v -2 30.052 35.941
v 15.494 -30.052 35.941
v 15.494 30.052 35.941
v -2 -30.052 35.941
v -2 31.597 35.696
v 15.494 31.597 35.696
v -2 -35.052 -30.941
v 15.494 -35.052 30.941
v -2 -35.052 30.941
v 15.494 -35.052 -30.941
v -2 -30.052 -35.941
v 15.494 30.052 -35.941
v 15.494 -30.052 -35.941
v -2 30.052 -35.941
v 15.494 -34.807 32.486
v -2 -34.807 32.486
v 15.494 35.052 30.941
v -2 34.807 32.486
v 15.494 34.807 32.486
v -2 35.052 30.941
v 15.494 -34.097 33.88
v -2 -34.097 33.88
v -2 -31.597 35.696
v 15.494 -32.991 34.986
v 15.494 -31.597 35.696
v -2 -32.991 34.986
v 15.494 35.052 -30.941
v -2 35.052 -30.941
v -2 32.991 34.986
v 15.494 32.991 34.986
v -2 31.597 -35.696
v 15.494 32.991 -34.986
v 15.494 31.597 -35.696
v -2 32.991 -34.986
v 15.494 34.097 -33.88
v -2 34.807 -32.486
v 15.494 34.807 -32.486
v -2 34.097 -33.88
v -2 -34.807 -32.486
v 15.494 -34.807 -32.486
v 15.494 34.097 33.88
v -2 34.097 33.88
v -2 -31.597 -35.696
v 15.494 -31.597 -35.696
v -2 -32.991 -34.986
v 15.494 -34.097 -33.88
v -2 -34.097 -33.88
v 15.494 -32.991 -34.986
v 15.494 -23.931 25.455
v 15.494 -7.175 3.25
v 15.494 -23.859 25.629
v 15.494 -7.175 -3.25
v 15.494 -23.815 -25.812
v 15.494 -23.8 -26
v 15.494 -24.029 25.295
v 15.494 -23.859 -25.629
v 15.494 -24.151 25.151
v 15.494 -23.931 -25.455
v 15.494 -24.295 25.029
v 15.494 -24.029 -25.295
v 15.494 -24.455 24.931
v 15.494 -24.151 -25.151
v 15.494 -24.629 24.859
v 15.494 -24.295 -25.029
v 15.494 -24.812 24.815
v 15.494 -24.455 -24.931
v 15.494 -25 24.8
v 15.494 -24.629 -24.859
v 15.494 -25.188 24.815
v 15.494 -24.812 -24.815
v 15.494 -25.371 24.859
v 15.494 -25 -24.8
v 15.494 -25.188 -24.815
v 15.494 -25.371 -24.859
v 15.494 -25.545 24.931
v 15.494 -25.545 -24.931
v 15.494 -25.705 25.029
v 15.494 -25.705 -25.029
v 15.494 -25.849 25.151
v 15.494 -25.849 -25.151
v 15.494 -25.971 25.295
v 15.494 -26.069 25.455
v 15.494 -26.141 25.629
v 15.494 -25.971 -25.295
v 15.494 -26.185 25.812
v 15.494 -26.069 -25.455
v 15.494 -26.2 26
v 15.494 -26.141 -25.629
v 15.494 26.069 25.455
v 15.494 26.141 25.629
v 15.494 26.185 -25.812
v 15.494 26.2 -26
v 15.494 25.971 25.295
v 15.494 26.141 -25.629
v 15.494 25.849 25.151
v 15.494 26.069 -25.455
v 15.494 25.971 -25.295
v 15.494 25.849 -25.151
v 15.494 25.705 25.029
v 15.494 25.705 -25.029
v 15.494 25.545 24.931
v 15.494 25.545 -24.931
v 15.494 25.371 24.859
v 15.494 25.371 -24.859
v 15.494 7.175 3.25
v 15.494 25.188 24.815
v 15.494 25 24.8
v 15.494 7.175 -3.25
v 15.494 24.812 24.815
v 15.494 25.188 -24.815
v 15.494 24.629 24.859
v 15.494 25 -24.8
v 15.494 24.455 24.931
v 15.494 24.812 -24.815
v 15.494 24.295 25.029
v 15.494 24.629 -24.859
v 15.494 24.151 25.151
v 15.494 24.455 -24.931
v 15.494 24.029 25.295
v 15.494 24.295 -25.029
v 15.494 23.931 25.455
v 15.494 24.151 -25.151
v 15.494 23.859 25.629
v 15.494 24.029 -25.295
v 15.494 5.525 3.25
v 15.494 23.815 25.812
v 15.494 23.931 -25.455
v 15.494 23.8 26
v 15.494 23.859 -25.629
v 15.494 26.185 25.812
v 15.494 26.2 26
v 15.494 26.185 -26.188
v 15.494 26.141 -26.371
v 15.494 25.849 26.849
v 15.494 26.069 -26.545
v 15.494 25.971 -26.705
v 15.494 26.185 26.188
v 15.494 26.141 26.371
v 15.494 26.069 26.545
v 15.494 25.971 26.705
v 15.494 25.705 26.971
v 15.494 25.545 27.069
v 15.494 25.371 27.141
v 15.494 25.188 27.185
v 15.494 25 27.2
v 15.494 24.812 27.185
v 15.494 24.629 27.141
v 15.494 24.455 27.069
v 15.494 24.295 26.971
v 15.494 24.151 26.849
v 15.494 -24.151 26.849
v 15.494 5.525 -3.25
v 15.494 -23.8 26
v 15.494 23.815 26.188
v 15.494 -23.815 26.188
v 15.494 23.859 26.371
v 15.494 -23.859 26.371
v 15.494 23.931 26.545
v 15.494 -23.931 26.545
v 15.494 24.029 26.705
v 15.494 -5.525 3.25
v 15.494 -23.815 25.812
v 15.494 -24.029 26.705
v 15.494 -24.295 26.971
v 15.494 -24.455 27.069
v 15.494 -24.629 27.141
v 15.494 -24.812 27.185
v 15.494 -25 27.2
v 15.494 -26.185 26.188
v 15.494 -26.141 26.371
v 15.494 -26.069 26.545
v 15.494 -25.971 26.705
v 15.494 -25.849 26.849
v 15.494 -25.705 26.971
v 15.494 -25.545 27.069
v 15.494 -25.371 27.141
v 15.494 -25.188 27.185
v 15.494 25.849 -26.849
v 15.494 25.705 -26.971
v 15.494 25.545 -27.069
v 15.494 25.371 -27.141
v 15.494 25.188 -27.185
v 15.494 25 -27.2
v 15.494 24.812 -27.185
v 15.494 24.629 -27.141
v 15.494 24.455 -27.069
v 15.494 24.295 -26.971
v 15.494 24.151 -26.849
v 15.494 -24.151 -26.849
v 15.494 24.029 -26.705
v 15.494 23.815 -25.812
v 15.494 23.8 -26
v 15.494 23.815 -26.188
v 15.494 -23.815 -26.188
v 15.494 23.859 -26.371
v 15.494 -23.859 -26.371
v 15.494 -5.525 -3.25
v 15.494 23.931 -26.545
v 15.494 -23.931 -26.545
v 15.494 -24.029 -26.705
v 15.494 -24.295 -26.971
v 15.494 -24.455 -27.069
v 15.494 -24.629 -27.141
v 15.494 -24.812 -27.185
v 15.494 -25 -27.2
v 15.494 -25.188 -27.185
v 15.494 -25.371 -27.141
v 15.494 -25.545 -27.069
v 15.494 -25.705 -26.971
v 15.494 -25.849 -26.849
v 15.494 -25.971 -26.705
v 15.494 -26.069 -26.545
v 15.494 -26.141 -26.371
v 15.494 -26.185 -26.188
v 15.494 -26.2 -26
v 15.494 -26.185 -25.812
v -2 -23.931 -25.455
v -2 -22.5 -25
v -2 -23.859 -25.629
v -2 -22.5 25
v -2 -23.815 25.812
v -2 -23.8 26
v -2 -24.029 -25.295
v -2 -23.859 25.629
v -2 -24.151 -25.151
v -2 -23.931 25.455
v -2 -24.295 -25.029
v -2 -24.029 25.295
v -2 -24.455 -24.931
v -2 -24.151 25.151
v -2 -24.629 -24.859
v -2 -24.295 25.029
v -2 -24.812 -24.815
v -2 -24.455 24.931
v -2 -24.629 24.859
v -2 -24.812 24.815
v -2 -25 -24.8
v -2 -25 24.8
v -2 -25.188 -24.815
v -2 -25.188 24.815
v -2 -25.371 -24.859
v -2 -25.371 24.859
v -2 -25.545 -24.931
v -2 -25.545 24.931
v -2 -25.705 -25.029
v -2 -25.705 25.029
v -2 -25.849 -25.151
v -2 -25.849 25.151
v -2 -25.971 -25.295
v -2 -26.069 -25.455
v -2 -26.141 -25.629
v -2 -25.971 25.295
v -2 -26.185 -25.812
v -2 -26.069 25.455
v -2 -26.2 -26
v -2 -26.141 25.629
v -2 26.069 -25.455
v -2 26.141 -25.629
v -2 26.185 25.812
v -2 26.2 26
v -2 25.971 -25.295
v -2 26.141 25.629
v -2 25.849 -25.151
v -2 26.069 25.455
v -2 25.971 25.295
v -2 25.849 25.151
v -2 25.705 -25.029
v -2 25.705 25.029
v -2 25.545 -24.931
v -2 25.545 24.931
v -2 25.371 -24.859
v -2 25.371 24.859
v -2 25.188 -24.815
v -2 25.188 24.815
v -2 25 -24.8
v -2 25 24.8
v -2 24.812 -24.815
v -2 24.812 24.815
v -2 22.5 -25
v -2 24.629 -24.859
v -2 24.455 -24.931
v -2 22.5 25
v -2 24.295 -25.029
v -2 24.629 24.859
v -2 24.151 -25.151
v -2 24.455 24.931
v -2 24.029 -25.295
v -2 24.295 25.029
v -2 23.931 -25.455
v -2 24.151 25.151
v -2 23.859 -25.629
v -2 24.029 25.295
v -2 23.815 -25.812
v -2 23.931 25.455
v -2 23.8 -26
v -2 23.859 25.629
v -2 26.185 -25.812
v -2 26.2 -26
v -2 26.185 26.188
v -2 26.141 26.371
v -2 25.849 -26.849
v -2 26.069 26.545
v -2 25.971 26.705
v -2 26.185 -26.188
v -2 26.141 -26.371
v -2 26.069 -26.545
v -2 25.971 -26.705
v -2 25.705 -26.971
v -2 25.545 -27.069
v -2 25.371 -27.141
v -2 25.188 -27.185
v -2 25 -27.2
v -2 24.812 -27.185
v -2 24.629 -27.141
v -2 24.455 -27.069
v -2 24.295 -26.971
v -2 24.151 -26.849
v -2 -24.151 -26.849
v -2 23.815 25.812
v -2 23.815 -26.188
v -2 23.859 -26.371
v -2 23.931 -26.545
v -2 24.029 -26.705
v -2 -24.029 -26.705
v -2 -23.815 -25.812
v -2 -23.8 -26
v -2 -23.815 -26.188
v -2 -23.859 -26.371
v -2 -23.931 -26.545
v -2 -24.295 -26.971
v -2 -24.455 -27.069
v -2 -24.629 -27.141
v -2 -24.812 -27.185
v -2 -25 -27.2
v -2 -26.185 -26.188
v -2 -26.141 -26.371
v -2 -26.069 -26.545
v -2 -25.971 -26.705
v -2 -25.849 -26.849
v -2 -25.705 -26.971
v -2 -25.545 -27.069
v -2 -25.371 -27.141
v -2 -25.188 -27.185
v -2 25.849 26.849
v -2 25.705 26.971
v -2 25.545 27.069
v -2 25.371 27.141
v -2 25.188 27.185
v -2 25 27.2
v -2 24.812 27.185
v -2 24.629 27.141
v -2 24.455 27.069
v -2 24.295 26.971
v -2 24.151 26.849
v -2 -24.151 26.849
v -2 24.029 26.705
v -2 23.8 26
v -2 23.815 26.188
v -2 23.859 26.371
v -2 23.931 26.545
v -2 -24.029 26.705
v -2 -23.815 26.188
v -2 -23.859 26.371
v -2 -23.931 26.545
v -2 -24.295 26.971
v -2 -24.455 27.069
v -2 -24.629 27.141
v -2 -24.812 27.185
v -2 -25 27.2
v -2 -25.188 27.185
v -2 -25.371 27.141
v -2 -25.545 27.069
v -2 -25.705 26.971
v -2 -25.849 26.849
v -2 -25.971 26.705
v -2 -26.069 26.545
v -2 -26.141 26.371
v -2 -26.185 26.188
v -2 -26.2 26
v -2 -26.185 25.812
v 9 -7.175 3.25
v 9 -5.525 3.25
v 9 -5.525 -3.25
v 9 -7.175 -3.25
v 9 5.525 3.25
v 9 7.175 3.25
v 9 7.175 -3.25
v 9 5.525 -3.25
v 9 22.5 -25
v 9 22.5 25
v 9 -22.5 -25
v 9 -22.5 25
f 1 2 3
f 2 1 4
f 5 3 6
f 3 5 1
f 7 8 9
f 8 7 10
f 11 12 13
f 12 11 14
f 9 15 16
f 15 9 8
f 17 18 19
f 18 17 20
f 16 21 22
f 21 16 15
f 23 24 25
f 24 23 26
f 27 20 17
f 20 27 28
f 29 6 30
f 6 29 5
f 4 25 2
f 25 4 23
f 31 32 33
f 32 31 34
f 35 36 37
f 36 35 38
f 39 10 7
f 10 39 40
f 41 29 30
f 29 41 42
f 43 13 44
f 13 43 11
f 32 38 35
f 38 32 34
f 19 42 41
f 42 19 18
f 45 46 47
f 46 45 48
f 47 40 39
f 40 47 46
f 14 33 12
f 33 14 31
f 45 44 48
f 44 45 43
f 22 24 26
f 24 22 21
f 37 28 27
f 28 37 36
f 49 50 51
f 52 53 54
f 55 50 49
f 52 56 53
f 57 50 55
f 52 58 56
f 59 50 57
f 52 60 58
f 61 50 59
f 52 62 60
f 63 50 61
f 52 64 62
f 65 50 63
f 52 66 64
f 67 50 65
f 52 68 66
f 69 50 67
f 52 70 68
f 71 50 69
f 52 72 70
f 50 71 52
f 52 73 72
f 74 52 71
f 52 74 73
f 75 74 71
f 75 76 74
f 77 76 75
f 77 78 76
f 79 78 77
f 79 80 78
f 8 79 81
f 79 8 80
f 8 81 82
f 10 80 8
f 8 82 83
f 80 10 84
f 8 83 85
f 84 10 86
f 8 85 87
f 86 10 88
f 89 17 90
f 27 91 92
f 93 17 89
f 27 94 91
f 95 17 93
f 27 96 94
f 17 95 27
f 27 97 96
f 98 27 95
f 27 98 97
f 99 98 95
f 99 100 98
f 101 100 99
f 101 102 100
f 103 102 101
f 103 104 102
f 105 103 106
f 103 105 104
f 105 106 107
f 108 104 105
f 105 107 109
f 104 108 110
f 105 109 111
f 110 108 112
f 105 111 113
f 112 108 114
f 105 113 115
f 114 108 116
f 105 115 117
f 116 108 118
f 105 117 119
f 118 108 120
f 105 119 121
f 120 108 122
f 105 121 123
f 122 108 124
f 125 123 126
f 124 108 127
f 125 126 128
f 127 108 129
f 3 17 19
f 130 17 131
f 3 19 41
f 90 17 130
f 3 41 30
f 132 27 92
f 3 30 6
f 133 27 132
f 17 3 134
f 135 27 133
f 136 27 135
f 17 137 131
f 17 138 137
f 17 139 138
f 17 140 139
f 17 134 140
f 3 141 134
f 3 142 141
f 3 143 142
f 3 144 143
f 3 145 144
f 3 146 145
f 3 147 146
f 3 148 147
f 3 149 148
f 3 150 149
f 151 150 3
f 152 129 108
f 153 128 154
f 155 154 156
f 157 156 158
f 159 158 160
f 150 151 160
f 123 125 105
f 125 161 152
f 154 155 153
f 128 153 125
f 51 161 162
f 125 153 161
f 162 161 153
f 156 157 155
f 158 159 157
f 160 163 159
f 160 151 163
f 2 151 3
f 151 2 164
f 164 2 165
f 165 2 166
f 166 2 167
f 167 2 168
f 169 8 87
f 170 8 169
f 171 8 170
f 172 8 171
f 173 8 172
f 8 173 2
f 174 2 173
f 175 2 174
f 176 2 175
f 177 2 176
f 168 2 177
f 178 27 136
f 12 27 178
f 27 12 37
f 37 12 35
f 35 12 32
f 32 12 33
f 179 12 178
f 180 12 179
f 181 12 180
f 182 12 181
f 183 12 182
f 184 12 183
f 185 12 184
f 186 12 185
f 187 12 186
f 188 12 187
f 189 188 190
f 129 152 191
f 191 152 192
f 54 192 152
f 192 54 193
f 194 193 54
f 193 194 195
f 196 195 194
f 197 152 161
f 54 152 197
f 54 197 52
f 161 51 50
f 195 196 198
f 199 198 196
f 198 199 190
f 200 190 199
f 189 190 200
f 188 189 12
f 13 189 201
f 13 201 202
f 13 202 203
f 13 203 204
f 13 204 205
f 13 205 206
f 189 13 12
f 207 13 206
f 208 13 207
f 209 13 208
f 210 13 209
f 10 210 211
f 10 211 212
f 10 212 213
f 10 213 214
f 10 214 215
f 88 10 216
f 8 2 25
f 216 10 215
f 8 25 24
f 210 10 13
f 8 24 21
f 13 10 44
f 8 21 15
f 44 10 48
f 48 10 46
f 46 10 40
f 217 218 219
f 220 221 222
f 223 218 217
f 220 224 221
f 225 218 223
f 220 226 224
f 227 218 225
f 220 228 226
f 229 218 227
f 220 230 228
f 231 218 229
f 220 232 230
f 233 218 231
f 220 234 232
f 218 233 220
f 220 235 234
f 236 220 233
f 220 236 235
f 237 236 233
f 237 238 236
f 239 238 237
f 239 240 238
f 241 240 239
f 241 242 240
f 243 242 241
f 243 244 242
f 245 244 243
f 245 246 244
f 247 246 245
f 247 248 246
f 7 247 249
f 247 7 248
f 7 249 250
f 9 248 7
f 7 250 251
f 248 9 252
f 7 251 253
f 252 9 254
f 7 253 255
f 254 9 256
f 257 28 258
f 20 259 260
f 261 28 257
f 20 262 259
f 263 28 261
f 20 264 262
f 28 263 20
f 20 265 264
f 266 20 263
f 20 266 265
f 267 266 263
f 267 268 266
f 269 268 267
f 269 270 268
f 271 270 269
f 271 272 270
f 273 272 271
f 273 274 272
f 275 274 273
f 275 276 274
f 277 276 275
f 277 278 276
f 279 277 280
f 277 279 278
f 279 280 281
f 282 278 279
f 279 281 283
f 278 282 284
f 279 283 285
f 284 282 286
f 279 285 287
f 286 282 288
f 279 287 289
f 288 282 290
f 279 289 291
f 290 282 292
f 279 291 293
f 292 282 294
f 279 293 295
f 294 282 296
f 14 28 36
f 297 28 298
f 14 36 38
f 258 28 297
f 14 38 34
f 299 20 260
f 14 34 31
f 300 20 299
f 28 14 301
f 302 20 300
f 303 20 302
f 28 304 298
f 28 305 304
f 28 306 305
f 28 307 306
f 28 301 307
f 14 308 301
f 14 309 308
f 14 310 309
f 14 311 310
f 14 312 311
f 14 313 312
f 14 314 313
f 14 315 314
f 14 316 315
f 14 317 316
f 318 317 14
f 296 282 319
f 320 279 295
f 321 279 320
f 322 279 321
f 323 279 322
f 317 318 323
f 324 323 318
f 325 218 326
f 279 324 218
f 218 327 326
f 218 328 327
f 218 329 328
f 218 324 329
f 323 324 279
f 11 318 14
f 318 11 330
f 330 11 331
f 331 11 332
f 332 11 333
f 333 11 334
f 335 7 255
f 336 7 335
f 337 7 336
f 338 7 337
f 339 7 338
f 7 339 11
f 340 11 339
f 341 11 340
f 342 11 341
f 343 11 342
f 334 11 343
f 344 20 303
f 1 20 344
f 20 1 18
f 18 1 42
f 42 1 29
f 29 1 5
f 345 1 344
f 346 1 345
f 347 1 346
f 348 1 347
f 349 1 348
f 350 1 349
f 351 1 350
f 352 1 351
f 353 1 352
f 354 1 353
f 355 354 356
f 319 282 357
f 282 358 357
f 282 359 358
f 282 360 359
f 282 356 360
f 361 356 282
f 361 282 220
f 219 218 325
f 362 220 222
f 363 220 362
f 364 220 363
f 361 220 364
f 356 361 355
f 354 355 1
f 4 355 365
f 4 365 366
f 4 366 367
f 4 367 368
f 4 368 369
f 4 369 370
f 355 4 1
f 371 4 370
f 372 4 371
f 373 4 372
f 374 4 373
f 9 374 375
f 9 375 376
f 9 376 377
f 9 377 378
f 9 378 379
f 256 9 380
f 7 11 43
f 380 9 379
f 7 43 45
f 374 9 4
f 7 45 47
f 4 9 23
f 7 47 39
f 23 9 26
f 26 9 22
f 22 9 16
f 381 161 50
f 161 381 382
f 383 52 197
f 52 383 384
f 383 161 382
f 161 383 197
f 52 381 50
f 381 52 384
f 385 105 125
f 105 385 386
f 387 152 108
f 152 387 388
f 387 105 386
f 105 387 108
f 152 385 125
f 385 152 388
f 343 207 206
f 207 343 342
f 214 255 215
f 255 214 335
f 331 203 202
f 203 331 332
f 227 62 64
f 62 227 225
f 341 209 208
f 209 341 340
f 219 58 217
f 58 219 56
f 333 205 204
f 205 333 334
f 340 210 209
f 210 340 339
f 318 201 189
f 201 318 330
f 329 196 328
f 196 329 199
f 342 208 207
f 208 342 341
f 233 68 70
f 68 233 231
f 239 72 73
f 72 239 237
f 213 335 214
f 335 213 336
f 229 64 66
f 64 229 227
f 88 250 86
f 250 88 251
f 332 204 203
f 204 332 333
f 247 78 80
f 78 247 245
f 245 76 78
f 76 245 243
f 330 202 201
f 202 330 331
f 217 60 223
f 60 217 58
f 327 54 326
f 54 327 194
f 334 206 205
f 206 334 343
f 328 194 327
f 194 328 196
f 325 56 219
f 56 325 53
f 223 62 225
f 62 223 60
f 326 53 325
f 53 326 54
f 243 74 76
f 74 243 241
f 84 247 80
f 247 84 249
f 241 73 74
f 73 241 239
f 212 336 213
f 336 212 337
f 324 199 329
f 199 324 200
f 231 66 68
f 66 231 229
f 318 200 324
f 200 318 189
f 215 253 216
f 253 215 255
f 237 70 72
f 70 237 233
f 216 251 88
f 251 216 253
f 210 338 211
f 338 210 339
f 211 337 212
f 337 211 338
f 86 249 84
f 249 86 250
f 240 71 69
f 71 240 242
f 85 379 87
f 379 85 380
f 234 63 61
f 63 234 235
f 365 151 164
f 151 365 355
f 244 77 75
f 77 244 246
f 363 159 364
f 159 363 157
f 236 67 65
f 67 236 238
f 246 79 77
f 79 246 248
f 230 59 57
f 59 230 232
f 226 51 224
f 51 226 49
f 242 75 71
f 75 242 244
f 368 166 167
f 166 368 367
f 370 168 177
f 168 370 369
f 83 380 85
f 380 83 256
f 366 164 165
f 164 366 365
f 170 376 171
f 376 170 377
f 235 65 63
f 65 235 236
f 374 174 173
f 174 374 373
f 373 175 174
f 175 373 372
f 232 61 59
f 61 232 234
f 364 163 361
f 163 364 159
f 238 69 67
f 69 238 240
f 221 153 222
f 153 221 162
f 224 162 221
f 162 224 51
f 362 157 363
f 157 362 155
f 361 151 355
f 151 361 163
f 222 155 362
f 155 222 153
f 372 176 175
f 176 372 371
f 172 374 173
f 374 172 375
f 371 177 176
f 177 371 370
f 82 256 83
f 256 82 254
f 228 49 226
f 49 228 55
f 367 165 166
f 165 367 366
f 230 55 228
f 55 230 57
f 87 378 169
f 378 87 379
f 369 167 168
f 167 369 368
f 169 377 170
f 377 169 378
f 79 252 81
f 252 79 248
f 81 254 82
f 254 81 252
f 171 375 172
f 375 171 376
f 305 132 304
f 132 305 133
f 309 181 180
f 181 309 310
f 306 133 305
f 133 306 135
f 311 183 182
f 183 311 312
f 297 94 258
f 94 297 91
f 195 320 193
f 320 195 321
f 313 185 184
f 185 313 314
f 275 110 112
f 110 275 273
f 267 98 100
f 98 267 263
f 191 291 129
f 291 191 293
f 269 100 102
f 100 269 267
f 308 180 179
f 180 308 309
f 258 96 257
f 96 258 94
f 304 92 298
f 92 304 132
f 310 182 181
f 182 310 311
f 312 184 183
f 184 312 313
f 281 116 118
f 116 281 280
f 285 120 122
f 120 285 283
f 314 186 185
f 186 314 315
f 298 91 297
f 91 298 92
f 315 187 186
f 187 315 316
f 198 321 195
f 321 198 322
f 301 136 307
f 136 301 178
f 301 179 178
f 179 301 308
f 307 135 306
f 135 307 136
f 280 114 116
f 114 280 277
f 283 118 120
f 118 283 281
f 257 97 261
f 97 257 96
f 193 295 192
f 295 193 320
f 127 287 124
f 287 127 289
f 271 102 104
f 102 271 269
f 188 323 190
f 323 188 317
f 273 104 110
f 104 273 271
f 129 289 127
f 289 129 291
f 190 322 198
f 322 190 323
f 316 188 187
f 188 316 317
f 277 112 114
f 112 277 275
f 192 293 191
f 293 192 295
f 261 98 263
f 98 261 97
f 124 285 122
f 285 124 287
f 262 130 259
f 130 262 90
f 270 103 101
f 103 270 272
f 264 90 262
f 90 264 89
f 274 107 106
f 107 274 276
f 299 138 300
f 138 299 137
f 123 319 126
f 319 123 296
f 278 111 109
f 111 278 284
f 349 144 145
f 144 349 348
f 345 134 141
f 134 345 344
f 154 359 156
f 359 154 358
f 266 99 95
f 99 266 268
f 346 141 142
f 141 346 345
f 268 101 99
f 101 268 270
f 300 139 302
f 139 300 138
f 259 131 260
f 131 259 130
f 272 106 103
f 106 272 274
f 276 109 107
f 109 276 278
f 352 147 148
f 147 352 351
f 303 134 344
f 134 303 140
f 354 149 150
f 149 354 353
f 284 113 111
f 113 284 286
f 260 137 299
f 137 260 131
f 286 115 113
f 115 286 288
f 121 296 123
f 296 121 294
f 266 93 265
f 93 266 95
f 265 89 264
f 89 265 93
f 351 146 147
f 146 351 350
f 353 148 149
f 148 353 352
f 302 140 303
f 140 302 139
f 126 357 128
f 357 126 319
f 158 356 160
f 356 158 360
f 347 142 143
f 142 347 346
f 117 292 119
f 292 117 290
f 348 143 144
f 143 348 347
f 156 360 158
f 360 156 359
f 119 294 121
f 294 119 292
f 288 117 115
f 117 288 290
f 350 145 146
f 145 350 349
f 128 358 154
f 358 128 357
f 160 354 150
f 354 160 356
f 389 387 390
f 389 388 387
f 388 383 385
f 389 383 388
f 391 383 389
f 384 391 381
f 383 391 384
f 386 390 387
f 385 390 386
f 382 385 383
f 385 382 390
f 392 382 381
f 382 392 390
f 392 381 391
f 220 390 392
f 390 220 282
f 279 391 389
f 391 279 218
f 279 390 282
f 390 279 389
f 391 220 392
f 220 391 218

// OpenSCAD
// Millimetres. Original native task geometry. MIT.
part="intact_rear";
$fn=40;
module intact_Body(){ union(){
polyhedron(points=[[-15.494000000000002,35.052,30.941],[-15.494000000000002,34.80728258147577,32.48608497187474],[-15.494000000000002,34.097084971874736,33.879926261462366],[-15.494000000000002,32.99092626146236,34.98608497187473],[-15.494000000000002,31.59708497187474,35.696282581475764],[-15.494000000000002,30.052,35.941],[-15.494000000000002,-30.052,35.941],[-15.494000000000002,-31.59708497187474,35.696282581475764],[-15.494000000000002,-32.99092626146236,34.98608497187473],[-15.494000000000002,-34.097084971874736,33.879926261462366],[-15.494000000000002,-34.80728258147577,32.48608497187474],[-15.494000000000002,-35.052,30.941],[-15.494000000000002,-35.052,-30.941],[-15.494000000000002,-34.80728258147577,-32.48608497187474],[-15.494000000000002,-34.097084971874736,-33.879926261462366],[-15.494000000000002,-32.99092626146236,-34.98608497187473],[-15.494000000000002,-31.59708497187474,-35.696282581475764],[-15.494000000000002,-30.052,-35.941],[-15.494000000000002,30.052,-35.941],[-15.494000000000002,31.59708497187474,-35.696282581475764],[-15.494000000000002,32.99092626146236,-34.98608497187473],[-15.494000000000002,34.097084971874736,-33.87992626146237],[-15.494000000000002,34.80728258147577,-32.48608497187474],[-15.494000000000002,35.052,-30.941],[15.494000000000002,35.052,30.941],[15.494000000000002,34.80728258147577,32.48608497187474],[15.494000000000002,34.097084971874736,33.879926261462366],[15.494000000000002,32.99092626146236,34.98608497187473],[15.494000000000002,31.59708497187474,35.696282581475764],[15.494000000000002,30.052,35.941],[15.494000000000002,-30.052,35.941],[15.494000000000002,-31.59708497187474,35.696282581475764],[15.494000000000002,-32.99092626146236,34.98608497187473],[15.494000000000002,-34.097084971874736,33.879926261462366],[15.494000000000002,-34.80728258147577,32.48608497187474],[15.494000000000002,-35.052,30.941],[15.494000000000002,-35.052,-30.941],[15.494000000000002,-34.80728258147577,-32.48608497187474],[15.494000000000002,-34.097084971874736,-33.879926261462366],[15.494000000000002,-32.99092626146236,-34.98608497187473],[15.494000000000002,-31.59708497187474,-35.696282581475764],[15.494000000000002,-30.052,-35.941],[15.494000000000002,30.052,-35.941],[15.494000000000002,31.59708497187474,-35.696282581475764],[15.494000000000002,32.99092626146236,-34.98608497187473],[15.494000000000002,34.097084971874736,-33.87992626146237],[15.494000000000002,34.80728258147577,-32.48608497187474],[15.494000000000002,35.052,-30.941]],faces=[[12,11,35],[36,12,35],[18,17,41],[42,18,41],[6,5,29],[30,6,29],[5,4,29],[4,28,29],[0,23,47],[24,0,47],[23,22,47],[22,46,47],[1,0,25],[0,24,25],[2,1,25],[26,2,25],[28,4,27],[4,3,27],[3,2,27],[2,26,27],[41,17,16],[40,41,16],[6,30,31],[7,6,31],[8,7,31],[32,8,31],[46,22,45],[22,21,45],[21,20,45],[20,44,45],[18,42,43],[19,18,43],[20,19,43],[44,20,43],[12,36,37],[13,12,37],[14,13,37],[38,14,37],[40,16,39],[16,15,39],[15,14,39],[14,38,39],[11,12,9],[23,0,9],[6,7,9],[0,1,9],[16,17,9],[17,18,9],[4,5,9],[21,22,9],[5,6,9],[2,3,9],[12,13,9],[3,4,9],[10,11,9],[20,21,9],[18,19,9],[22,23,9],[1,2,9],[14,15,9],[7,8,9],[15,16,9],[19,20,9],[13,14,9],[8,32,9],[32,33,9],[30,29,34],[24,47,34],[36,35,34],[46,45,34],[28,27,34],[42,41,34],[43,42,34],[29,28,34],[25,24,34],[41,40,34],[47,46,34],[26,25,34],[27,26,34],[31,30,34],[40,39,34],[37,36,34],[32,31,34],[33,32,34],[45,44,34],[44,43,34],[38,37,34],[39,38,34],[35,11,34],[11,10,34],[10,9,34],[9,33,34]]);
}}
module intact_Body_ACBlade0(){ union(){
polyhedron(points=[[14.994,-7.111999999999999,-3.175],[14.994,-7.111999999999999,3.175],[14.994,-5.588,-3.175],[14.994,-5.588,3.175],[29.369,-7.111999999999999,-3.175],[29.369,-7.111999999999999,3.175],[29.369,-5.588,-3.175],[29.369,-5.588,3.175],[31.369,-6.6,-3.175],[31.369,-6.6,3.175],[31.369,-6.1,-3.175],[31.369,-6.1,3.175]],faces=[[0,2,3],[1,0,3],[2,6,3],[6,7,3],[4,0,5],[0,1,5],[0,4,10],[2,0,10],[4,8,10],[6,2,10],[7,6,11],[6,10,11],[1,3,9],[3,7,9],[5,1,9],[7,11,9],[8,4,9],[4,5,9],[10,8,9],[11,10,9]]);
}}
module intact_Body_ACBlade1(){ union(){
polyhedron(points=[[14.994,5.588,-3.175],[14.994,5.588,3.175],[14.994,7.111999999999999,-3.175],[14.994,7.111999999999999,3.175],[29.369,5.588,-3.175],[29.369,5.588,3.175],[29.369,7.111999999999999,-3.175],[29.369,7.111999999999999,3.175],[31.369,6.1,-3.175],[31.369,6.1,3.175],[31.369,6.6,-3.175],[31.369,6.6,3.175]],faces=[[0,2,3],[1,0,3],[2,6,3],[6,7,3],[4,0,5],[0,1,5],[0,4,10],[2,0,10],[4,8,10],[6,2,10],[7,6,11],[6,10,11],[1,3,9],[3,7,9],[5,1,9],[7,11,9],[8,4,9],[4,5,9],[10,8,9],[11,10,9]]);
}}
module damaged_Body(){ union(){
polyhedron(points=[[-6.0,35.052,30.941],[-6.0,34.80728258147577,32.48608497187474],[-6.0,34.097084971874736,33.879926261462366],[-6.0,32.99092626146236,34.98608497187473],[-6.0,31.59708497187474,35.696282581475764],[-6.0,30.052,35.941],[-6.0,-30.052,35.941],[-6.0,-31.59708497187474,35.696282581475764],[-6.0,-32.99092626146236,34.98608497187473],[-6.0,-34.097084971874736,33.879926261462366],[-6.0,-34.80728258147577,32.48608497187474],[-6.0,-35.052,30.941],[-6.0,-35.052,-30.941],[-6.0,-34.80728258147577,-32.48608497187474],[-6.0,-34.097084971874736,-33.879926261462366],[-6.0,-32.99092626146236,-34.98608497187473],[-6.0,-31.59708497187474,-35.696282581475764],[-6.0,-30.052,-35.941],[-6.0,30.052,-35.941],[-6.0,31.59708497187474,-35.696282581475764],[-6.0,32.99092626146236,-34.98608497187473],[-6.0,34.097084971874736,-33.87992626146237],[-6.0,34.80728258147577,-32.48608497187474],[-6.0,35.052,-30.941],[15.494000000000002,35.052,30.941],[15.494000000000002,34.80728258147577,32.48608497187474],[15.494000000000002,34.097084971874736,33.879926261462366],[15.494000000000002,32.99092626146236,34.98608497187473],[15.494000000000002,31.59708497187474,35.696282581475764],[15.494000000000002,30.052,35.941],[15.494000000000002,-30.052,35.941],[15.494000000000002,-31.59708497187474,35.696282581475764],[15.494000000000002,-32.99092626146236,34.98608497187473],[15.494000000000002,-34.097084971874736,33.879926261462366],[15.494000000000002,-34.80728258147577,32.48608497187474],[15.494000000000002,-35.052,30.941],[15.494000000000002,-35.052,-30.941],[15.494000000000002,-34.80728258147577,-32.48608497187474],[15.494000000000002,-34.097084971874736,-33.879926261462366],[15.494000000000002,-32.99092626146236,-34.98608497187473],[15.494000000000002,-31.59708497187474,-35.696282581475764],[15.494000000000002,-30.052,-35.941],[15.494000000000002,30.052,-35.941],[15.494000000000002,31.59708497187474,-35.696282581475764],[15.494000000000002,32.99092626146236,-34.98608497187473],[15.494000000000002,34.097084971874736,-33.87992626146237],[15.494000000000002,34.80728258147577,-32.48608497187474],[15.494000000000002,35.052,-30.941]],faces=[[12,11,35],[36,12,35],[18,17,41],[42,18,41],[6,5,29],[30,6,29],[5,4,29],[4,28,29],[0,23,47],[24,0,47],[23,22,47],[22,46,47],[1,0,25],[0,24,25],[2,1,25],[26,2,25],[28,4,27],[4,3,27],[3,2,27],[2,26,27],[41,17,16],[40,41,16],[35,11,34],[11,10,34],[10,9,34],[9,33,34],[6,30,31],[7,6,31],[46,22,45],[22,21,45],[21,20,45],[20,44,45],[18,42,43],[19,18,43],[20,19,43],[44,20,43],[11,12,14],[23,0,14],[6,7,14],[0,1,14],[8,9,14],[17,18,14],[4,5,14],[21,22,14],[5,6,14],[2,3,14],[12,13,14],[3,4,14],[10,11,14],[20,21,14],[18,19,14],[22,23,14],[1,2,14],[16,17,14],[7,8,14],[15,16,14],[9,10,14],[19,20,14],[12,36,37],[13,12,37],[14,13,37],[38,14,37],[40,16,39],[16,15,39],[15,14,39],[14,38,39],[30,29,32],[24,47,32],[36,35,32],[46,45,32],[28,27,32],[42,41,32],[35,34,32],[29,28,32],[25,24,32],[41,40,32],[47,46,32],[26,25,32],[27,26,32],[43,42,32],[31,30,32],[37,36,32],[34,33,32],[40,39,32],[45,44,32],[44,43,32],[38,37,32],[39,38,32],[33,9,32],[9,8,32],[8,7,32],[7,31,32]]);
polyhedron(points=[[-6.999999999999999,35.052,30.941],[-7.0279262145982235,34.80728258147577,32.48608497187474],[-7.108971245934641,34.097084971874736,33.879926261462366],[-7.2352018416681085,32.99092626146236,34.98608497187473],[-7.394261671587955,31.59708497187474,35.696282581475764],[-7.57058085130663,30.052,35.941],[-14.42941914869337,-30.052,35.941],[-14.605738328412045,-31.59708497187474,35.696282581475764],[-14.76479815833189,-32.99092626146236,34.98608497187473],[-14.891028754065358,-34.097084971874736,33.879926261462366],[-14.972073785401776,-34.80728258147577,32.48608497187474],[-15.0,-35.052,30.941],[-15.0,-35.052,-30.941],[-14.972073785401776,-34.80728258147577,-32.48608497187474],[-14.891028754065358,-34.097084971874736,-33.879926261462366],[-14.76479815833189,-32.99092626146236,-34.98608497187473],[-14.605738328412045,-31.59708497187474,-35.696282581475764],[-14.42941914869337,-30.052,-35.941],[-7.57058085130663,30.052,-35.941],[-7.394261671587955,31.59708497187474,-35.696282581475764],[-7.2352018416681085,32.99092626146236,-34.98608497187473],[-7.108971245934641,34.097084971874736,-33.87992626146237],[-7.0279262145982235,34.80728258147577,-32.48608497187474],[-6.999999999999999,35.052,-30.941],[-17.082649341977127,35.052,30.941],[-17.239544002517984,34.80728258147577,32.48608497187474],[-17.436933149732173,34.097084971874736,33.879926261462366],[-17.655494958599306,32.99092626146236,34.98608497187473],[-17.873835076457805,31.59708497187474,35.696282581475764],[-18.070580851306634,30.052,35.941],[-24.92941914869337,-30.052,35.941],[-25.085311733281895,-31.59708497187474,35.696282581475764],[-25.185091275263087,-32.99092626146236,34.98608497187473],[-25.21899065786289,-34.097084971874736,33.879926261462366],[-25.183691573321536,-34.80728258147577,32.48608497187474],[-25.082649341977127,-35.052,30.941],[-19.91735065802287,-35.052,-30.941],[-19.76045599748201,-34.80728258147577,-32.48608497187474],[-19.563066850267827,-34.097084971874736,-33.879926261462366],[-19.34450504140069,-32.99092626146236,-34.98608497187473],[-19.126164923542195,-31.59708497187474,-35.696282581475764],[-18.92941914869337,-30.052,-35.941],[-12.07058085130663,30.052,-35.941],[-11.914688266718104,31.59708497187474,-35.696282581475764],[-11.814908724736908,32.99092626146236,-34.98608497187473],[-11.781009342137107,34.097084971874736,-33.87992626146237],[-11.816308426678459,34.80728258147577,-32.48608497187474],[-11.91735065802287,35.052,-30.941],[-20.1368,-28.0416,-28.7528],[-22.3192,-28.0416,-14.3764],[-23.58,-28.0416,0.0],[-23.919199999999996,-28.0416,14.376400000000004],[-23.336799999999997,-28.0416,28.7528],[-19.9192,-14.0208,-28.7528],[-23.9448,-14.0208,-14.3764],[-25.820000000000004,-14.0208,0.0],[-25.5448,-14.0208,14.376400000000004],[-23.1192,-14.0208,28.7528],[-18.78,0.0,-28.7528],[-23.419999999999998,0.0,-14.3764],[-25.500000000000004,0.0,0.0],[-25.02,0.0,14.376400000000004],[-21.98,0.0,28.7528],[-16.7192,14.0208,-28.7528],[-20.7448,14.0208,-14.3764],[-22.62,14.0208,0.0],[-22.3448,14.0208,14.376400000000004],[-19.919199999999996,14.0208,28.7528],[-13.736799999999997,28.0416,-28.7528],[-15.919199999999998,28.0416,-14.3764],[-17.179999999999996,28.0416,0.0],[-17.519199999999998,28.0416,14.376400000000004],[-16.936799999999998,28.0416,28.7528]],faces=[[36,55,35],[61,29,30],[31,61,30],[24,65,47],[41,58,59],[61,66,27],[55,56,33],[47,65,46],[45,46,64],[46,65,64],[55,54,60],[54,59,60],[65,66,60],[66,61,60],[56,55,60],[61,56,60],[64,65,60],[59,64,60],[58,41,42],[59,58,42],[29,61,28],[61,27,28],[65,24,25],[66,65,26],[27,66,26],[65,25,26],[35,55,34],[55,33,34],[64,59,43],[59,42,43],[38,54,37],[55,36,37],[54,55,37],[41,59,40],[59,54,40],[33,56,32],[61,31,32],[56,61,32],[45,64,44],[64,43,44],[54,38,39],[40,54,39],[11,12,35],[12,36,35],[5,6,30],[29,5,30],[30,6,7],[31,30,7],[0,24,23],[24,47,23],[17,18,42],[41,17,42],[11,35,34],[10,11,34],[9,10,34],[33,9,34],[45,21,22],[46,45,22],[23,47,22],[47,46,22],[18,19,43],[42,18,43],[36,12,37],[12,13,37],[17,41,40],[16,17,40],[37,13,14],[38,37,14],[27,26,3],[26,2,3],[24,0,1],[25,24,1],[2,26,1],[26,25,1],[31,7,32],[7,8,32],[9,33,32],[8,9,32],[21,45,44],[20,21,44],[19,20,44],[43,19,44],[14,15,39],[38,14,39],[15,16,39],[16,40,39],[12,11,4],[11,10,4],[7,6,4],[13,12,4],[18,17,4],[6,5,4],[22,21,4],[0,23,4],[17,16,4],[1,0,4],[10,9,4],[9,8,4],[19,18,4],[16,15,4],[21,20,4],[15,14,4],[8,7,4],[23,22,4],[20,19,4],[14,13,4],[3,2,4],[2,1,4],[5,29,4],[29,28,4],[27,3,4],[28,27,4]]);
translate([-6.4,-32.552,0]) cube([1.5,2.0,52.0],center=true);
}}
module damaged_Body_ACBlade0(){ union(){
polyhedron(points=[[14.994,-7.111999999999999,-3.175],[14.994,-7.111999999999999,3.175],[14.994,-5.588,-3.175],[14.994,-5.588,3.175],[29.369,-7.111999999999999,-3.175],[29.369,-7.111999999999999,3.175],[29.369,-5.588,-3.175],[29.369,-5.588,3.175],[31.369,-6.6,-3.175],[31.369,-6.6,3.175],[31.369,-6.1,-3.175],[31.369,-6.1,3.175]],faces=[[0,2,3],[1,0,3],[2,6,3],[6,7,3],[4,0,5],[0,1,5],[0,4,10],[2,0,10],[4,8,10],[6,2,10],[7,6,11],[6,10,11],[1,3,9],[3,7,9],[5,1,9],[7,11,9],[8,4,9],[4,5,9],[10,8,9],[11,10,9]]);
}}
module damaged_Body_ACBlade1(){ union(){
polyhedron(points=[[14.994,5.588,-3.175],[14.994,5.588,3.175],[14.994,7.111999999999999,-3.175],[14.994,7.111999999999999,3.175],[29.369,5.588,-3.175],[29.369,5.588,3.175],[29.369,7.111999999999999,-3.175],[29.369,7.111999999999999,3.175],[31.369,6.1,-3.175],[31.369,6.1,3.175],[31.369,6.6,-3.175],[31.369,6.6,3.175]],faces=[[0,2,3],[1,0,3],[2,6,3],[6,7,3],[4,0,5],[0,1,5],[0,4,10],[2,0,10],[4,8,10],[6,2,10],[7,6,11],[6,10,11],[1,3,9],[3,7,9],[5,1,9],[7,11,9],[8,4,9],[4,5,9],[10,8,9],[11,10,9]]);
}}
module socket_Socket(){ union(){
translate([40.0,0,-5.0]) cube([25.0,330.0,150.0],center=true);
translate([25.0,0,-90.0]) cube([120.0,350.0,10.0],center=true);
translate([2.0,-130.0,22.0]) cube([4.0,70.0,36.0],center=true);
translate([2.0,-130.0,-22.0]) cube([4.0,70.0,36.0],center=true);
translate([2.0,-151.35000000000002,0]) cube([4.0,27.300000000000004,8.0],center=true);
translate([2.0,-130.0,0]) cube([4.0,9.999999999999998,8.0],center=true);
translate([2.0,-108.64999999999999,0]) cube([4.0,27.300000000000004,8.0],center=true);
translate([2.0,130.0,22.0]) cube([4.0,70.0,36.0],center=true);
translate([2.0,130.0,-22.0]) cube([4.0,70.0,36.0],center=true);
translate([2.0,108.64999999999999,0]) cube([4.0,27.300000000000004,8.0],center=true);
translate([2.0,130.0,0]) cube([4.0,9.999999999999998,8.0],center=true);
translate([2.0,151.35000000000002,0]) cube([4.0,27.300000000000004,8.0],center=true);
}}
module socket_Leaf0_0_N(){ union(){
translate([0,0,0]) cube([10.0,1.0,7.0],center=true);
}}
module socket_Leaf0_0_P(){ union(){
translate([0,0,0]) cube([10.0,1.0,7.0],center=true);
}}
module socket_Leaf0_1_N(){ union(){
translate([0,0,0]) cube([10.0,1.0,7.0],center=true);
}}
module socket_Leaf0_1_P(){ union(){
translate([0,0,0]) cube([10.0,1.0,7.0],center=true);
}}
module socket_Leaf1_0_N(){ union(){
translate([0,0,0]) cube([10.0,1.0,7.0],center=true);
}}
module socket_Leaf1_0_P(){ union(){
translate([0,0,0]) cube([10.0,1.0,7.0],center=true);
}}
module socket_Leaf1_1_N(){ union(){
translate([0,0,0]) cube([10.0,1.0,7.0],center=true);
}}
module socket_Leaf1_1_P(){ union(){
translate([0,0,0]) cube([10.0,1.0,7.0],center=true);
}}
module supports_IntactPad(){ union(){
translate([285.0,-110.0,751.5]) cube([110.0,120.0,8.0],center=true);
}}
module supports_DamagedPad(){ union(){
translate([285.0,150.0,751.5]) cube([110.0,120.0,8.0],center=true);
}}
module shell(name){
if(name=="intact") intact_Body(); else damaged_Body();
}
module rear(name){difference(){intersection(){shell(name);translate([50,0,0])cube([104,100,100],center=true);}cube([18,45,50],center=true);
for(y=[-6.35,6.35]) translate([15.0,y,0])cube([14,1.65,6.5],center=true);
for(y=[-25,25],z=[-26,26])translate([0,y,z])rotate([0,90,0])cylinder(d=2.4,h=50,center=true);}}
module front(name){difference(){intersection(){shell(name);translate([-52,0,0])cube([100,100,100],center=true);}cube([18,45,50],center=true);
for(y=[-25,25],z=[-26,26])translate([0,y,z])rotate([0,90,0])cylinder(d=2.4,h=50,center=true);}}
if(part=="intact_rear")rear("intact");
if(part=="intact_front")front("intact");
if(part=="damaged_rear")rear("damaged");
if(part=="damaged_front")front("damaged");
if(part=="intact")intact_Body();
if(part=="damaged")damaged_Body();
if(part=="socket_body")socket_Socket();
if(part=="contact_leaf")socket_Leaf0_0_P();
if(part=="blade")translate([-15.494,6.350,0])intact_Body_ACBlade0();
if(part=="ceramic_pad")cube([110,120,8],center=true);
